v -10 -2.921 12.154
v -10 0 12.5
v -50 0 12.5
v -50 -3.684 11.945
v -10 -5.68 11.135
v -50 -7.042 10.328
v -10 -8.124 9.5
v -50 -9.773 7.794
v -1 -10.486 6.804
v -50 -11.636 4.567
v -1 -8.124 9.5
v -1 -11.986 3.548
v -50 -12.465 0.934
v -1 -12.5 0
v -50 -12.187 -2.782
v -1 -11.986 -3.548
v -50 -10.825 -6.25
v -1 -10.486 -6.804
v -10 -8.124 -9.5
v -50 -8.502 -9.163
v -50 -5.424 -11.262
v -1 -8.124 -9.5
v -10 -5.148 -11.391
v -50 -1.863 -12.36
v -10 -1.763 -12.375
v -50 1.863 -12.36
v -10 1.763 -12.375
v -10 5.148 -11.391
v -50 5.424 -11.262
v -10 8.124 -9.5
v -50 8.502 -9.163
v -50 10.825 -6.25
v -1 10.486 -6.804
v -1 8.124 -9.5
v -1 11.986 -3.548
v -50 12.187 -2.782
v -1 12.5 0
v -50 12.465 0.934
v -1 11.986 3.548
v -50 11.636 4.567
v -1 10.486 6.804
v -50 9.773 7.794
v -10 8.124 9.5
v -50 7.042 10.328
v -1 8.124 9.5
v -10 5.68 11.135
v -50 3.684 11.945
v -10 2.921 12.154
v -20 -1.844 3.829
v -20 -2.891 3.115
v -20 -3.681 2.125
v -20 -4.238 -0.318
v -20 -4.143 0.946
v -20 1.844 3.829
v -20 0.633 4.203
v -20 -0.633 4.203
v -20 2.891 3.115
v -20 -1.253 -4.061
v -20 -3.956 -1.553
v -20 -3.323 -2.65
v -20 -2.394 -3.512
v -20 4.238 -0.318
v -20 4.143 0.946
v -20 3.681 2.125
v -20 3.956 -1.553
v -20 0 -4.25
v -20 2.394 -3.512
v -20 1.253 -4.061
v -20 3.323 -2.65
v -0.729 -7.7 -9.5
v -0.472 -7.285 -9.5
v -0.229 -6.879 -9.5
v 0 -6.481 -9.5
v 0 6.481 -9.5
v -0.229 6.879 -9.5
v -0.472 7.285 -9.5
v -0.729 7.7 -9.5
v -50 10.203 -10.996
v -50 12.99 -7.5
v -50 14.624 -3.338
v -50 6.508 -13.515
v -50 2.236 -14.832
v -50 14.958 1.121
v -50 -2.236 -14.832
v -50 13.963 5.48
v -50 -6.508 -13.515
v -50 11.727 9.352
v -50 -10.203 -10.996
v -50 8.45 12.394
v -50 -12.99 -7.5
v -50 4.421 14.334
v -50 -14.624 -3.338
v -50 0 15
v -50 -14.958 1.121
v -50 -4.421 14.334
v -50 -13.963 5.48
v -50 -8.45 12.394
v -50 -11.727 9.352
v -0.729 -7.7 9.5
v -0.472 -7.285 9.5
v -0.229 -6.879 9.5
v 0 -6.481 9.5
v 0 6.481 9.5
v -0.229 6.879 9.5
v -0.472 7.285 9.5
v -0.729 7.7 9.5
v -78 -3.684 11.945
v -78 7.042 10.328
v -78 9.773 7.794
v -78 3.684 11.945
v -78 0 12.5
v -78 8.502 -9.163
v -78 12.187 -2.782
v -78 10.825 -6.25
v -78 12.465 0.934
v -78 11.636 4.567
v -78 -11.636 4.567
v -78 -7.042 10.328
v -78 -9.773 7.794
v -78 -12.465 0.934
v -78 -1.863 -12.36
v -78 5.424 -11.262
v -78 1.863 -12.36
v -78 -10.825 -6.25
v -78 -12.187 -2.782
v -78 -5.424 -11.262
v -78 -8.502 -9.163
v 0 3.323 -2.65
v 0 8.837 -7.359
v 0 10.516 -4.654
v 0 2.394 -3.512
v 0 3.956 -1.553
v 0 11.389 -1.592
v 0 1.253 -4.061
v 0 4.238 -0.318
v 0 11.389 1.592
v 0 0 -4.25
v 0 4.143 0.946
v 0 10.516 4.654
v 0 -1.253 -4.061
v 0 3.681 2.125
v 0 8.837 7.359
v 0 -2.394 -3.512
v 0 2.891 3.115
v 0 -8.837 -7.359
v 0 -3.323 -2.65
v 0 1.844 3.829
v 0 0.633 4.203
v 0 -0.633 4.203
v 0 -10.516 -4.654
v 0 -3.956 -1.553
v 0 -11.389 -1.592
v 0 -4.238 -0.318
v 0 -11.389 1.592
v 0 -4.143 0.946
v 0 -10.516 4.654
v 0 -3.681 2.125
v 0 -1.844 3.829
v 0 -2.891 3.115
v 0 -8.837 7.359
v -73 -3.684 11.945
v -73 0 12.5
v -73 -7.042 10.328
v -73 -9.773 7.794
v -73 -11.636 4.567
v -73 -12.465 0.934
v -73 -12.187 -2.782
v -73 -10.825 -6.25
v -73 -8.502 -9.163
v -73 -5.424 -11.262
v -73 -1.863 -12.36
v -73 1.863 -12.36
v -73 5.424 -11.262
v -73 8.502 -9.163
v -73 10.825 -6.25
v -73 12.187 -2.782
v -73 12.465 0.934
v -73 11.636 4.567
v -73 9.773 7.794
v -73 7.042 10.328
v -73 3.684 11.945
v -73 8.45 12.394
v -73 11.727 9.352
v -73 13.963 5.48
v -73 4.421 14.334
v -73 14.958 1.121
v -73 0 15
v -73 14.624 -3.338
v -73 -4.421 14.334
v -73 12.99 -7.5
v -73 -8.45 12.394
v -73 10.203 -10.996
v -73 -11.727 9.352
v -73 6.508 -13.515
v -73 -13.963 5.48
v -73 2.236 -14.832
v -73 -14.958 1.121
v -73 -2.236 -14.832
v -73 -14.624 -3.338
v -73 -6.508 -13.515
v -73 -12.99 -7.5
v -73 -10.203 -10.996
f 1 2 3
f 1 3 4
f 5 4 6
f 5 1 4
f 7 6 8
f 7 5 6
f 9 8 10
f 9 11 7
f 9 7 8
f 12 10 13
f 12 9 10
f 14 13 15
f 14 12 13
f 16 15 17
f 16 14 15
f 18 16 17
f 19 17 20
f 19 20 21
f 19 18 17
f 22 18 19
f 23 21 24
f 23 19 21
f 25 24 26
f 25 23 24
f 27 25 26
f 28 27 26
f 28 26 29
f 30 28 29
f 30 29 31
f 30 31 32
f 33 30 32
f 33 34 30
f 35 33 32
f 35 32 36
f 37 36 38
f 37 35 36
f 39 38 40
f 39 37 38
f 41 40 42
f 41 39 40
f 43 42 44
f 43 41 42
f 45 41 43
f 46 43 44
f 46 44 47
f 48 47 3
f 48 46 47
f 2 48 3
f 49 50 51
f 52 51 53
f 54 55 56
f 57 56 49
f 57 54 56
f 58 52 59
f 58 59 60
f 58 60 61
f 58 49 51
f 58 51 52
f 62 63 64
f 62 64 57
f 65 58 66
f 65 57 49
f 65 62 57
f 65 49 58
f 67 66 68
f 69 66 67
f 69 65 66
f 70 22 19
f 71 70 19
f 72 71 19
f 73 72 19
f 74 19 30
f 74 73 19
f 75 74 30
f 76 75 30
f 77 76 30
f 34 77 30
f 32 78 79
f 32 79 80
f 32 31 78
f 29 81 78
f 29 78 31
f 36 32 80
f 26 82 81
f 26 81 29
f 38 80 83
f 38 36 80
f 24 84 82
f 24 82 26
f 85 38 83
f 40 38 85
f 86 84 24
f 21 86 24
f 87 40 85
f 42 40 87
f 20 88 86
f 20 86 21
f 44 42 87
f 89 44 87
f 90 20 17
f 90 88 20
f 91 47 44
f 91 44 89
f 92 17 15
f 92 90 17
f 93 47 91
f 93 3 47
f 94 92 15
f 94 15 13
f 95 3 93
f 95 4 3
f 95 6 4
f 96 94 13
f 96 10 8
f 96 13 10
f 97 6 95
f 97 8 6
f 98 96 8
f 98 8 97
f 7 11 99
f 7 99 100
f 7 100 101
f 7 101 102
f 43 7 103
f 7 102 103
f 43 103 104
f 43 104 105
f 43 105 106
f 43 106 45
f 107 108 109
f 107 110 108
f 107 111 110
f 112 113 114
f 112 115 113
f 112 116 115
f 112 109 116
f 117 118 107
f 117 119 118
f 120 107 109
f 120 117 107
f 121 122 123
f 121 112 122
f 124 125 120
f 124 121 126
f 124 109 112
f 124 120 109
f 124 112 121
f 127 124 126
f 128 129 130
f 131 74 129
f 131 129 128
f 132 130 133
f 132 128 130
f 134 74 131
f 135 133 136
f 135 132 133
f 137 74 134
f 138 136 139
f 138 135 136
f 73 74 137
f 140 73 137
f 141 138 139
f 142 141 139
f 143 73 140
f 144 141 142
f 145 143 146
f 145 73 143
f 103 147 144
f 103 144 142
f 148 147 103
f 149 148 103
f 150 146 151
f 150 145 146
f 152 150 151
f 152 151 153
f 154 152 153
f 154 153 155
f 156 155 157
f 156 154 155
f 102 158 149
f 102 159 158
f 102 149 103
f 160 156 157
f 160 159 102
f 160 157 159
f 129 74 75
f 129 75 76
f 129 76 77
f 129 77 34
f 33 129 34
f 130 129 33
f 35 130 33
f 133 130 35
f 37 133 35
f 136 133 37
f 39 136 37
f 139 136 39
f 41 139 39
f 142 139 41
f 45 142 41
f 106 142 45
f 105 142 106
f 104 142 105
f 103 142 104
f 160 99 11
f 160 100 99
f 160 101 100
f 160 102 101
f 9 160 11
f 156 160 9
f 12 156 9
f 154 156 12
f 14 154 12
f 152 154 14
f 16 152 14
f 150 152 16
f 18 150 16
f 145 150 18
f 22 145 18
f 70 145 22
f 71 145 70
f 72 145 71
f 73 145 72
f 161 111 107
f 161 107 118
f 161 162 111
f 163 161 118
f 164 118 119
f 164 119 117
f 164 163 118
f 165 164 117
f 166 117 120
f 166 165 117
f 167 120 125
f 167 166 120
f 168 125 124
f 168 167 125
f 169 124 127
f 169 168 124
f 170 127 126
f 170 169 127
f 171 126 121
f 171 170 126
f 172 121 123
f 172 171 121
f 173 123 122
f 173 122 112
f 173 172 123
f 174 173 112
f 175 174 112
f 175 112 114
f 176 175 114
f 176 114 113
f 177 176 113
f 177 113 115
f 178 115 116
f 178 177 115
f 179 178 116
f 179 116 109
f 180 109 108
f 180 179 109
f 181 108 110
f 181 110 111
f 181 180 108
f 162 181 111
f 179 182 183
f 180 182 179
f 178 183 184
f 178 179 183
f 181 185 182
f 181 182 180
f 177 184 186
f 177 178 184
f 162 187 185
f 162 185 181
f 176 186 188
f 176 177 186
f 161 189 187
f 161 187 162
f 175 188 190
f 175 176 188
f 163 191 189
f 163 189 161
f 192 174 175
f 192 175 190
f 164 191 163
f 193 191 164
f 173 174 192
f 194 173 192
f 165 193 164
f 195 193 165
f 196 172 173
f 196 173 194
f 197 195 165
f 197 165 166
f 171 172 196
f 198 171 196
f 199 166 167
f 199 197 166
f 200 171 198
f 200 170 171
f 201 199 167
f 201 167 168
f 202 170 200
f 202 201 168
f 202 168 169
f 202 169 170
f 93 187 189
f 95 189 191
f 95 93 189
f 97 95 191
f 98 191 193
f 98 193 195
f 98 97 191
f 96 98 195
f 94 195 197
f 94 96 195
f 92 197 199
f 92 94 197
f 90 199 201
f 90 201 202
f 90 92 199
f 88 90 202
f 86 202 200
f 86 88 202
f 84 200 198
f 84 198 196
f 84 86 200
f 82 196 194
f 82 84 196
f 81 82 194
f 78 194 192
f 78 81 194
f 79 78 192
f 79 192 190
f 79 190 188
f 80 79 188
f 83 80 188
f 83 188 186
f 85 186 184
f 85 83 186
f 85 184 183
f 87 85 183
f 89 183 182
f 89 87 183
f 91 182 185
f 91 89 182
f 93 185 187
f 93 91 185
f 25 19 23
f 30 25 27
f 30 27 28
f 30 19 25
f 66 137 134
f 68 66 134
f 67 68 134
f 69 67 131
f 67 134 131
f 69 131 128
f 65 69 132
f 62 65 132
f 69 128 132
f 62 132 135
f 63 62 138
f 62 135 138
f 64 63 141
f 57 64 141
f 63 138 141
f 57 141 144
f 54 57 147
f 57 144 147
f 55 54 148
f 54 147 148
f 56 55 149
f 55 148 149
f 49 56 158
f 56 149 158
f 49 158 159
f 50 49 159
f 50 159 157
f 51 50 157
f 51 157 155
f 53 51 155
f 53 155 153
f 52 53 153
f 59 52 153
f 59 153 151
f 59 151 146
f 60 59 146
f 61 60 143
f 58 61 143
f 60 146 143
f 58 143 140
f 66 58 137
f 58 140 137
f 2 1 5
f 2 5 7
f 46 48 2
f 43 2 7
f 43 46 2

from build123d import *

# Parameters (mm, degrees)
SKETCH_2_W          = 4.5
SKETCH_2_H          = 28
CUT_EXTRUDE_1_DEPTH = 10
SKETCH_3_R          = 4.25
CUT_EXTRUDE_2_DEPTH = 20


with BuildPart() as part:
    # ｽｹｯﾁ1 → 回転1 (revolve)
    with BuildSketch(Plane.XY, mode=Mode.PRIVATE) as revolve_1_sk:
        Polygon((-78, 0), (-78, 12.5), (-73, 12.5), (-73, 15), (-50, 15), (-50, 12.5), (-1, 12.5), (0, 11.5), (0, 0), align=None)
    revolve(revolve_1_sk.sketch.rotate(Axis((-78, 0, 0), (1, 0, 0)), 90), axis=Axis((-78, 0, 0), (1, 0, 0)))

    # ｽｹｯﾁ2 → ｶｯﾄ - 押し出し1 (cut)
    with BuildSketch(Plane(origin=(0, 0, 0), x_dir=(0, 0, -1), z_dir=(1, 0, 0))):
        with Locations((11.75, 0)):
            Rectangle(SKETCH_2_W, SKETCH_2_H)
        with Locations((-11.75, 0)):
            Rectangle(SKETCH_2_W, SKETCH_2_H)
    extrude(amount=-CUT_EXTRUDE_1_DEPTH, mode=Mode.SUBTRACT)

    # ｽｹｯﾁ3 → ｶｯﾄ - 押し出し2 (cut)
    with BuildSketch(Plane(origin=(0, 0, 0), x_dir=(0, 0, -1), z_dir=(1, 0, 0))):
        Circle(SKETCH_3_R)
    extrude(amount=-CUT_EXTRUDE_2_DEPTH, mode=Mode.SUBTRACT)


solid = part.part
